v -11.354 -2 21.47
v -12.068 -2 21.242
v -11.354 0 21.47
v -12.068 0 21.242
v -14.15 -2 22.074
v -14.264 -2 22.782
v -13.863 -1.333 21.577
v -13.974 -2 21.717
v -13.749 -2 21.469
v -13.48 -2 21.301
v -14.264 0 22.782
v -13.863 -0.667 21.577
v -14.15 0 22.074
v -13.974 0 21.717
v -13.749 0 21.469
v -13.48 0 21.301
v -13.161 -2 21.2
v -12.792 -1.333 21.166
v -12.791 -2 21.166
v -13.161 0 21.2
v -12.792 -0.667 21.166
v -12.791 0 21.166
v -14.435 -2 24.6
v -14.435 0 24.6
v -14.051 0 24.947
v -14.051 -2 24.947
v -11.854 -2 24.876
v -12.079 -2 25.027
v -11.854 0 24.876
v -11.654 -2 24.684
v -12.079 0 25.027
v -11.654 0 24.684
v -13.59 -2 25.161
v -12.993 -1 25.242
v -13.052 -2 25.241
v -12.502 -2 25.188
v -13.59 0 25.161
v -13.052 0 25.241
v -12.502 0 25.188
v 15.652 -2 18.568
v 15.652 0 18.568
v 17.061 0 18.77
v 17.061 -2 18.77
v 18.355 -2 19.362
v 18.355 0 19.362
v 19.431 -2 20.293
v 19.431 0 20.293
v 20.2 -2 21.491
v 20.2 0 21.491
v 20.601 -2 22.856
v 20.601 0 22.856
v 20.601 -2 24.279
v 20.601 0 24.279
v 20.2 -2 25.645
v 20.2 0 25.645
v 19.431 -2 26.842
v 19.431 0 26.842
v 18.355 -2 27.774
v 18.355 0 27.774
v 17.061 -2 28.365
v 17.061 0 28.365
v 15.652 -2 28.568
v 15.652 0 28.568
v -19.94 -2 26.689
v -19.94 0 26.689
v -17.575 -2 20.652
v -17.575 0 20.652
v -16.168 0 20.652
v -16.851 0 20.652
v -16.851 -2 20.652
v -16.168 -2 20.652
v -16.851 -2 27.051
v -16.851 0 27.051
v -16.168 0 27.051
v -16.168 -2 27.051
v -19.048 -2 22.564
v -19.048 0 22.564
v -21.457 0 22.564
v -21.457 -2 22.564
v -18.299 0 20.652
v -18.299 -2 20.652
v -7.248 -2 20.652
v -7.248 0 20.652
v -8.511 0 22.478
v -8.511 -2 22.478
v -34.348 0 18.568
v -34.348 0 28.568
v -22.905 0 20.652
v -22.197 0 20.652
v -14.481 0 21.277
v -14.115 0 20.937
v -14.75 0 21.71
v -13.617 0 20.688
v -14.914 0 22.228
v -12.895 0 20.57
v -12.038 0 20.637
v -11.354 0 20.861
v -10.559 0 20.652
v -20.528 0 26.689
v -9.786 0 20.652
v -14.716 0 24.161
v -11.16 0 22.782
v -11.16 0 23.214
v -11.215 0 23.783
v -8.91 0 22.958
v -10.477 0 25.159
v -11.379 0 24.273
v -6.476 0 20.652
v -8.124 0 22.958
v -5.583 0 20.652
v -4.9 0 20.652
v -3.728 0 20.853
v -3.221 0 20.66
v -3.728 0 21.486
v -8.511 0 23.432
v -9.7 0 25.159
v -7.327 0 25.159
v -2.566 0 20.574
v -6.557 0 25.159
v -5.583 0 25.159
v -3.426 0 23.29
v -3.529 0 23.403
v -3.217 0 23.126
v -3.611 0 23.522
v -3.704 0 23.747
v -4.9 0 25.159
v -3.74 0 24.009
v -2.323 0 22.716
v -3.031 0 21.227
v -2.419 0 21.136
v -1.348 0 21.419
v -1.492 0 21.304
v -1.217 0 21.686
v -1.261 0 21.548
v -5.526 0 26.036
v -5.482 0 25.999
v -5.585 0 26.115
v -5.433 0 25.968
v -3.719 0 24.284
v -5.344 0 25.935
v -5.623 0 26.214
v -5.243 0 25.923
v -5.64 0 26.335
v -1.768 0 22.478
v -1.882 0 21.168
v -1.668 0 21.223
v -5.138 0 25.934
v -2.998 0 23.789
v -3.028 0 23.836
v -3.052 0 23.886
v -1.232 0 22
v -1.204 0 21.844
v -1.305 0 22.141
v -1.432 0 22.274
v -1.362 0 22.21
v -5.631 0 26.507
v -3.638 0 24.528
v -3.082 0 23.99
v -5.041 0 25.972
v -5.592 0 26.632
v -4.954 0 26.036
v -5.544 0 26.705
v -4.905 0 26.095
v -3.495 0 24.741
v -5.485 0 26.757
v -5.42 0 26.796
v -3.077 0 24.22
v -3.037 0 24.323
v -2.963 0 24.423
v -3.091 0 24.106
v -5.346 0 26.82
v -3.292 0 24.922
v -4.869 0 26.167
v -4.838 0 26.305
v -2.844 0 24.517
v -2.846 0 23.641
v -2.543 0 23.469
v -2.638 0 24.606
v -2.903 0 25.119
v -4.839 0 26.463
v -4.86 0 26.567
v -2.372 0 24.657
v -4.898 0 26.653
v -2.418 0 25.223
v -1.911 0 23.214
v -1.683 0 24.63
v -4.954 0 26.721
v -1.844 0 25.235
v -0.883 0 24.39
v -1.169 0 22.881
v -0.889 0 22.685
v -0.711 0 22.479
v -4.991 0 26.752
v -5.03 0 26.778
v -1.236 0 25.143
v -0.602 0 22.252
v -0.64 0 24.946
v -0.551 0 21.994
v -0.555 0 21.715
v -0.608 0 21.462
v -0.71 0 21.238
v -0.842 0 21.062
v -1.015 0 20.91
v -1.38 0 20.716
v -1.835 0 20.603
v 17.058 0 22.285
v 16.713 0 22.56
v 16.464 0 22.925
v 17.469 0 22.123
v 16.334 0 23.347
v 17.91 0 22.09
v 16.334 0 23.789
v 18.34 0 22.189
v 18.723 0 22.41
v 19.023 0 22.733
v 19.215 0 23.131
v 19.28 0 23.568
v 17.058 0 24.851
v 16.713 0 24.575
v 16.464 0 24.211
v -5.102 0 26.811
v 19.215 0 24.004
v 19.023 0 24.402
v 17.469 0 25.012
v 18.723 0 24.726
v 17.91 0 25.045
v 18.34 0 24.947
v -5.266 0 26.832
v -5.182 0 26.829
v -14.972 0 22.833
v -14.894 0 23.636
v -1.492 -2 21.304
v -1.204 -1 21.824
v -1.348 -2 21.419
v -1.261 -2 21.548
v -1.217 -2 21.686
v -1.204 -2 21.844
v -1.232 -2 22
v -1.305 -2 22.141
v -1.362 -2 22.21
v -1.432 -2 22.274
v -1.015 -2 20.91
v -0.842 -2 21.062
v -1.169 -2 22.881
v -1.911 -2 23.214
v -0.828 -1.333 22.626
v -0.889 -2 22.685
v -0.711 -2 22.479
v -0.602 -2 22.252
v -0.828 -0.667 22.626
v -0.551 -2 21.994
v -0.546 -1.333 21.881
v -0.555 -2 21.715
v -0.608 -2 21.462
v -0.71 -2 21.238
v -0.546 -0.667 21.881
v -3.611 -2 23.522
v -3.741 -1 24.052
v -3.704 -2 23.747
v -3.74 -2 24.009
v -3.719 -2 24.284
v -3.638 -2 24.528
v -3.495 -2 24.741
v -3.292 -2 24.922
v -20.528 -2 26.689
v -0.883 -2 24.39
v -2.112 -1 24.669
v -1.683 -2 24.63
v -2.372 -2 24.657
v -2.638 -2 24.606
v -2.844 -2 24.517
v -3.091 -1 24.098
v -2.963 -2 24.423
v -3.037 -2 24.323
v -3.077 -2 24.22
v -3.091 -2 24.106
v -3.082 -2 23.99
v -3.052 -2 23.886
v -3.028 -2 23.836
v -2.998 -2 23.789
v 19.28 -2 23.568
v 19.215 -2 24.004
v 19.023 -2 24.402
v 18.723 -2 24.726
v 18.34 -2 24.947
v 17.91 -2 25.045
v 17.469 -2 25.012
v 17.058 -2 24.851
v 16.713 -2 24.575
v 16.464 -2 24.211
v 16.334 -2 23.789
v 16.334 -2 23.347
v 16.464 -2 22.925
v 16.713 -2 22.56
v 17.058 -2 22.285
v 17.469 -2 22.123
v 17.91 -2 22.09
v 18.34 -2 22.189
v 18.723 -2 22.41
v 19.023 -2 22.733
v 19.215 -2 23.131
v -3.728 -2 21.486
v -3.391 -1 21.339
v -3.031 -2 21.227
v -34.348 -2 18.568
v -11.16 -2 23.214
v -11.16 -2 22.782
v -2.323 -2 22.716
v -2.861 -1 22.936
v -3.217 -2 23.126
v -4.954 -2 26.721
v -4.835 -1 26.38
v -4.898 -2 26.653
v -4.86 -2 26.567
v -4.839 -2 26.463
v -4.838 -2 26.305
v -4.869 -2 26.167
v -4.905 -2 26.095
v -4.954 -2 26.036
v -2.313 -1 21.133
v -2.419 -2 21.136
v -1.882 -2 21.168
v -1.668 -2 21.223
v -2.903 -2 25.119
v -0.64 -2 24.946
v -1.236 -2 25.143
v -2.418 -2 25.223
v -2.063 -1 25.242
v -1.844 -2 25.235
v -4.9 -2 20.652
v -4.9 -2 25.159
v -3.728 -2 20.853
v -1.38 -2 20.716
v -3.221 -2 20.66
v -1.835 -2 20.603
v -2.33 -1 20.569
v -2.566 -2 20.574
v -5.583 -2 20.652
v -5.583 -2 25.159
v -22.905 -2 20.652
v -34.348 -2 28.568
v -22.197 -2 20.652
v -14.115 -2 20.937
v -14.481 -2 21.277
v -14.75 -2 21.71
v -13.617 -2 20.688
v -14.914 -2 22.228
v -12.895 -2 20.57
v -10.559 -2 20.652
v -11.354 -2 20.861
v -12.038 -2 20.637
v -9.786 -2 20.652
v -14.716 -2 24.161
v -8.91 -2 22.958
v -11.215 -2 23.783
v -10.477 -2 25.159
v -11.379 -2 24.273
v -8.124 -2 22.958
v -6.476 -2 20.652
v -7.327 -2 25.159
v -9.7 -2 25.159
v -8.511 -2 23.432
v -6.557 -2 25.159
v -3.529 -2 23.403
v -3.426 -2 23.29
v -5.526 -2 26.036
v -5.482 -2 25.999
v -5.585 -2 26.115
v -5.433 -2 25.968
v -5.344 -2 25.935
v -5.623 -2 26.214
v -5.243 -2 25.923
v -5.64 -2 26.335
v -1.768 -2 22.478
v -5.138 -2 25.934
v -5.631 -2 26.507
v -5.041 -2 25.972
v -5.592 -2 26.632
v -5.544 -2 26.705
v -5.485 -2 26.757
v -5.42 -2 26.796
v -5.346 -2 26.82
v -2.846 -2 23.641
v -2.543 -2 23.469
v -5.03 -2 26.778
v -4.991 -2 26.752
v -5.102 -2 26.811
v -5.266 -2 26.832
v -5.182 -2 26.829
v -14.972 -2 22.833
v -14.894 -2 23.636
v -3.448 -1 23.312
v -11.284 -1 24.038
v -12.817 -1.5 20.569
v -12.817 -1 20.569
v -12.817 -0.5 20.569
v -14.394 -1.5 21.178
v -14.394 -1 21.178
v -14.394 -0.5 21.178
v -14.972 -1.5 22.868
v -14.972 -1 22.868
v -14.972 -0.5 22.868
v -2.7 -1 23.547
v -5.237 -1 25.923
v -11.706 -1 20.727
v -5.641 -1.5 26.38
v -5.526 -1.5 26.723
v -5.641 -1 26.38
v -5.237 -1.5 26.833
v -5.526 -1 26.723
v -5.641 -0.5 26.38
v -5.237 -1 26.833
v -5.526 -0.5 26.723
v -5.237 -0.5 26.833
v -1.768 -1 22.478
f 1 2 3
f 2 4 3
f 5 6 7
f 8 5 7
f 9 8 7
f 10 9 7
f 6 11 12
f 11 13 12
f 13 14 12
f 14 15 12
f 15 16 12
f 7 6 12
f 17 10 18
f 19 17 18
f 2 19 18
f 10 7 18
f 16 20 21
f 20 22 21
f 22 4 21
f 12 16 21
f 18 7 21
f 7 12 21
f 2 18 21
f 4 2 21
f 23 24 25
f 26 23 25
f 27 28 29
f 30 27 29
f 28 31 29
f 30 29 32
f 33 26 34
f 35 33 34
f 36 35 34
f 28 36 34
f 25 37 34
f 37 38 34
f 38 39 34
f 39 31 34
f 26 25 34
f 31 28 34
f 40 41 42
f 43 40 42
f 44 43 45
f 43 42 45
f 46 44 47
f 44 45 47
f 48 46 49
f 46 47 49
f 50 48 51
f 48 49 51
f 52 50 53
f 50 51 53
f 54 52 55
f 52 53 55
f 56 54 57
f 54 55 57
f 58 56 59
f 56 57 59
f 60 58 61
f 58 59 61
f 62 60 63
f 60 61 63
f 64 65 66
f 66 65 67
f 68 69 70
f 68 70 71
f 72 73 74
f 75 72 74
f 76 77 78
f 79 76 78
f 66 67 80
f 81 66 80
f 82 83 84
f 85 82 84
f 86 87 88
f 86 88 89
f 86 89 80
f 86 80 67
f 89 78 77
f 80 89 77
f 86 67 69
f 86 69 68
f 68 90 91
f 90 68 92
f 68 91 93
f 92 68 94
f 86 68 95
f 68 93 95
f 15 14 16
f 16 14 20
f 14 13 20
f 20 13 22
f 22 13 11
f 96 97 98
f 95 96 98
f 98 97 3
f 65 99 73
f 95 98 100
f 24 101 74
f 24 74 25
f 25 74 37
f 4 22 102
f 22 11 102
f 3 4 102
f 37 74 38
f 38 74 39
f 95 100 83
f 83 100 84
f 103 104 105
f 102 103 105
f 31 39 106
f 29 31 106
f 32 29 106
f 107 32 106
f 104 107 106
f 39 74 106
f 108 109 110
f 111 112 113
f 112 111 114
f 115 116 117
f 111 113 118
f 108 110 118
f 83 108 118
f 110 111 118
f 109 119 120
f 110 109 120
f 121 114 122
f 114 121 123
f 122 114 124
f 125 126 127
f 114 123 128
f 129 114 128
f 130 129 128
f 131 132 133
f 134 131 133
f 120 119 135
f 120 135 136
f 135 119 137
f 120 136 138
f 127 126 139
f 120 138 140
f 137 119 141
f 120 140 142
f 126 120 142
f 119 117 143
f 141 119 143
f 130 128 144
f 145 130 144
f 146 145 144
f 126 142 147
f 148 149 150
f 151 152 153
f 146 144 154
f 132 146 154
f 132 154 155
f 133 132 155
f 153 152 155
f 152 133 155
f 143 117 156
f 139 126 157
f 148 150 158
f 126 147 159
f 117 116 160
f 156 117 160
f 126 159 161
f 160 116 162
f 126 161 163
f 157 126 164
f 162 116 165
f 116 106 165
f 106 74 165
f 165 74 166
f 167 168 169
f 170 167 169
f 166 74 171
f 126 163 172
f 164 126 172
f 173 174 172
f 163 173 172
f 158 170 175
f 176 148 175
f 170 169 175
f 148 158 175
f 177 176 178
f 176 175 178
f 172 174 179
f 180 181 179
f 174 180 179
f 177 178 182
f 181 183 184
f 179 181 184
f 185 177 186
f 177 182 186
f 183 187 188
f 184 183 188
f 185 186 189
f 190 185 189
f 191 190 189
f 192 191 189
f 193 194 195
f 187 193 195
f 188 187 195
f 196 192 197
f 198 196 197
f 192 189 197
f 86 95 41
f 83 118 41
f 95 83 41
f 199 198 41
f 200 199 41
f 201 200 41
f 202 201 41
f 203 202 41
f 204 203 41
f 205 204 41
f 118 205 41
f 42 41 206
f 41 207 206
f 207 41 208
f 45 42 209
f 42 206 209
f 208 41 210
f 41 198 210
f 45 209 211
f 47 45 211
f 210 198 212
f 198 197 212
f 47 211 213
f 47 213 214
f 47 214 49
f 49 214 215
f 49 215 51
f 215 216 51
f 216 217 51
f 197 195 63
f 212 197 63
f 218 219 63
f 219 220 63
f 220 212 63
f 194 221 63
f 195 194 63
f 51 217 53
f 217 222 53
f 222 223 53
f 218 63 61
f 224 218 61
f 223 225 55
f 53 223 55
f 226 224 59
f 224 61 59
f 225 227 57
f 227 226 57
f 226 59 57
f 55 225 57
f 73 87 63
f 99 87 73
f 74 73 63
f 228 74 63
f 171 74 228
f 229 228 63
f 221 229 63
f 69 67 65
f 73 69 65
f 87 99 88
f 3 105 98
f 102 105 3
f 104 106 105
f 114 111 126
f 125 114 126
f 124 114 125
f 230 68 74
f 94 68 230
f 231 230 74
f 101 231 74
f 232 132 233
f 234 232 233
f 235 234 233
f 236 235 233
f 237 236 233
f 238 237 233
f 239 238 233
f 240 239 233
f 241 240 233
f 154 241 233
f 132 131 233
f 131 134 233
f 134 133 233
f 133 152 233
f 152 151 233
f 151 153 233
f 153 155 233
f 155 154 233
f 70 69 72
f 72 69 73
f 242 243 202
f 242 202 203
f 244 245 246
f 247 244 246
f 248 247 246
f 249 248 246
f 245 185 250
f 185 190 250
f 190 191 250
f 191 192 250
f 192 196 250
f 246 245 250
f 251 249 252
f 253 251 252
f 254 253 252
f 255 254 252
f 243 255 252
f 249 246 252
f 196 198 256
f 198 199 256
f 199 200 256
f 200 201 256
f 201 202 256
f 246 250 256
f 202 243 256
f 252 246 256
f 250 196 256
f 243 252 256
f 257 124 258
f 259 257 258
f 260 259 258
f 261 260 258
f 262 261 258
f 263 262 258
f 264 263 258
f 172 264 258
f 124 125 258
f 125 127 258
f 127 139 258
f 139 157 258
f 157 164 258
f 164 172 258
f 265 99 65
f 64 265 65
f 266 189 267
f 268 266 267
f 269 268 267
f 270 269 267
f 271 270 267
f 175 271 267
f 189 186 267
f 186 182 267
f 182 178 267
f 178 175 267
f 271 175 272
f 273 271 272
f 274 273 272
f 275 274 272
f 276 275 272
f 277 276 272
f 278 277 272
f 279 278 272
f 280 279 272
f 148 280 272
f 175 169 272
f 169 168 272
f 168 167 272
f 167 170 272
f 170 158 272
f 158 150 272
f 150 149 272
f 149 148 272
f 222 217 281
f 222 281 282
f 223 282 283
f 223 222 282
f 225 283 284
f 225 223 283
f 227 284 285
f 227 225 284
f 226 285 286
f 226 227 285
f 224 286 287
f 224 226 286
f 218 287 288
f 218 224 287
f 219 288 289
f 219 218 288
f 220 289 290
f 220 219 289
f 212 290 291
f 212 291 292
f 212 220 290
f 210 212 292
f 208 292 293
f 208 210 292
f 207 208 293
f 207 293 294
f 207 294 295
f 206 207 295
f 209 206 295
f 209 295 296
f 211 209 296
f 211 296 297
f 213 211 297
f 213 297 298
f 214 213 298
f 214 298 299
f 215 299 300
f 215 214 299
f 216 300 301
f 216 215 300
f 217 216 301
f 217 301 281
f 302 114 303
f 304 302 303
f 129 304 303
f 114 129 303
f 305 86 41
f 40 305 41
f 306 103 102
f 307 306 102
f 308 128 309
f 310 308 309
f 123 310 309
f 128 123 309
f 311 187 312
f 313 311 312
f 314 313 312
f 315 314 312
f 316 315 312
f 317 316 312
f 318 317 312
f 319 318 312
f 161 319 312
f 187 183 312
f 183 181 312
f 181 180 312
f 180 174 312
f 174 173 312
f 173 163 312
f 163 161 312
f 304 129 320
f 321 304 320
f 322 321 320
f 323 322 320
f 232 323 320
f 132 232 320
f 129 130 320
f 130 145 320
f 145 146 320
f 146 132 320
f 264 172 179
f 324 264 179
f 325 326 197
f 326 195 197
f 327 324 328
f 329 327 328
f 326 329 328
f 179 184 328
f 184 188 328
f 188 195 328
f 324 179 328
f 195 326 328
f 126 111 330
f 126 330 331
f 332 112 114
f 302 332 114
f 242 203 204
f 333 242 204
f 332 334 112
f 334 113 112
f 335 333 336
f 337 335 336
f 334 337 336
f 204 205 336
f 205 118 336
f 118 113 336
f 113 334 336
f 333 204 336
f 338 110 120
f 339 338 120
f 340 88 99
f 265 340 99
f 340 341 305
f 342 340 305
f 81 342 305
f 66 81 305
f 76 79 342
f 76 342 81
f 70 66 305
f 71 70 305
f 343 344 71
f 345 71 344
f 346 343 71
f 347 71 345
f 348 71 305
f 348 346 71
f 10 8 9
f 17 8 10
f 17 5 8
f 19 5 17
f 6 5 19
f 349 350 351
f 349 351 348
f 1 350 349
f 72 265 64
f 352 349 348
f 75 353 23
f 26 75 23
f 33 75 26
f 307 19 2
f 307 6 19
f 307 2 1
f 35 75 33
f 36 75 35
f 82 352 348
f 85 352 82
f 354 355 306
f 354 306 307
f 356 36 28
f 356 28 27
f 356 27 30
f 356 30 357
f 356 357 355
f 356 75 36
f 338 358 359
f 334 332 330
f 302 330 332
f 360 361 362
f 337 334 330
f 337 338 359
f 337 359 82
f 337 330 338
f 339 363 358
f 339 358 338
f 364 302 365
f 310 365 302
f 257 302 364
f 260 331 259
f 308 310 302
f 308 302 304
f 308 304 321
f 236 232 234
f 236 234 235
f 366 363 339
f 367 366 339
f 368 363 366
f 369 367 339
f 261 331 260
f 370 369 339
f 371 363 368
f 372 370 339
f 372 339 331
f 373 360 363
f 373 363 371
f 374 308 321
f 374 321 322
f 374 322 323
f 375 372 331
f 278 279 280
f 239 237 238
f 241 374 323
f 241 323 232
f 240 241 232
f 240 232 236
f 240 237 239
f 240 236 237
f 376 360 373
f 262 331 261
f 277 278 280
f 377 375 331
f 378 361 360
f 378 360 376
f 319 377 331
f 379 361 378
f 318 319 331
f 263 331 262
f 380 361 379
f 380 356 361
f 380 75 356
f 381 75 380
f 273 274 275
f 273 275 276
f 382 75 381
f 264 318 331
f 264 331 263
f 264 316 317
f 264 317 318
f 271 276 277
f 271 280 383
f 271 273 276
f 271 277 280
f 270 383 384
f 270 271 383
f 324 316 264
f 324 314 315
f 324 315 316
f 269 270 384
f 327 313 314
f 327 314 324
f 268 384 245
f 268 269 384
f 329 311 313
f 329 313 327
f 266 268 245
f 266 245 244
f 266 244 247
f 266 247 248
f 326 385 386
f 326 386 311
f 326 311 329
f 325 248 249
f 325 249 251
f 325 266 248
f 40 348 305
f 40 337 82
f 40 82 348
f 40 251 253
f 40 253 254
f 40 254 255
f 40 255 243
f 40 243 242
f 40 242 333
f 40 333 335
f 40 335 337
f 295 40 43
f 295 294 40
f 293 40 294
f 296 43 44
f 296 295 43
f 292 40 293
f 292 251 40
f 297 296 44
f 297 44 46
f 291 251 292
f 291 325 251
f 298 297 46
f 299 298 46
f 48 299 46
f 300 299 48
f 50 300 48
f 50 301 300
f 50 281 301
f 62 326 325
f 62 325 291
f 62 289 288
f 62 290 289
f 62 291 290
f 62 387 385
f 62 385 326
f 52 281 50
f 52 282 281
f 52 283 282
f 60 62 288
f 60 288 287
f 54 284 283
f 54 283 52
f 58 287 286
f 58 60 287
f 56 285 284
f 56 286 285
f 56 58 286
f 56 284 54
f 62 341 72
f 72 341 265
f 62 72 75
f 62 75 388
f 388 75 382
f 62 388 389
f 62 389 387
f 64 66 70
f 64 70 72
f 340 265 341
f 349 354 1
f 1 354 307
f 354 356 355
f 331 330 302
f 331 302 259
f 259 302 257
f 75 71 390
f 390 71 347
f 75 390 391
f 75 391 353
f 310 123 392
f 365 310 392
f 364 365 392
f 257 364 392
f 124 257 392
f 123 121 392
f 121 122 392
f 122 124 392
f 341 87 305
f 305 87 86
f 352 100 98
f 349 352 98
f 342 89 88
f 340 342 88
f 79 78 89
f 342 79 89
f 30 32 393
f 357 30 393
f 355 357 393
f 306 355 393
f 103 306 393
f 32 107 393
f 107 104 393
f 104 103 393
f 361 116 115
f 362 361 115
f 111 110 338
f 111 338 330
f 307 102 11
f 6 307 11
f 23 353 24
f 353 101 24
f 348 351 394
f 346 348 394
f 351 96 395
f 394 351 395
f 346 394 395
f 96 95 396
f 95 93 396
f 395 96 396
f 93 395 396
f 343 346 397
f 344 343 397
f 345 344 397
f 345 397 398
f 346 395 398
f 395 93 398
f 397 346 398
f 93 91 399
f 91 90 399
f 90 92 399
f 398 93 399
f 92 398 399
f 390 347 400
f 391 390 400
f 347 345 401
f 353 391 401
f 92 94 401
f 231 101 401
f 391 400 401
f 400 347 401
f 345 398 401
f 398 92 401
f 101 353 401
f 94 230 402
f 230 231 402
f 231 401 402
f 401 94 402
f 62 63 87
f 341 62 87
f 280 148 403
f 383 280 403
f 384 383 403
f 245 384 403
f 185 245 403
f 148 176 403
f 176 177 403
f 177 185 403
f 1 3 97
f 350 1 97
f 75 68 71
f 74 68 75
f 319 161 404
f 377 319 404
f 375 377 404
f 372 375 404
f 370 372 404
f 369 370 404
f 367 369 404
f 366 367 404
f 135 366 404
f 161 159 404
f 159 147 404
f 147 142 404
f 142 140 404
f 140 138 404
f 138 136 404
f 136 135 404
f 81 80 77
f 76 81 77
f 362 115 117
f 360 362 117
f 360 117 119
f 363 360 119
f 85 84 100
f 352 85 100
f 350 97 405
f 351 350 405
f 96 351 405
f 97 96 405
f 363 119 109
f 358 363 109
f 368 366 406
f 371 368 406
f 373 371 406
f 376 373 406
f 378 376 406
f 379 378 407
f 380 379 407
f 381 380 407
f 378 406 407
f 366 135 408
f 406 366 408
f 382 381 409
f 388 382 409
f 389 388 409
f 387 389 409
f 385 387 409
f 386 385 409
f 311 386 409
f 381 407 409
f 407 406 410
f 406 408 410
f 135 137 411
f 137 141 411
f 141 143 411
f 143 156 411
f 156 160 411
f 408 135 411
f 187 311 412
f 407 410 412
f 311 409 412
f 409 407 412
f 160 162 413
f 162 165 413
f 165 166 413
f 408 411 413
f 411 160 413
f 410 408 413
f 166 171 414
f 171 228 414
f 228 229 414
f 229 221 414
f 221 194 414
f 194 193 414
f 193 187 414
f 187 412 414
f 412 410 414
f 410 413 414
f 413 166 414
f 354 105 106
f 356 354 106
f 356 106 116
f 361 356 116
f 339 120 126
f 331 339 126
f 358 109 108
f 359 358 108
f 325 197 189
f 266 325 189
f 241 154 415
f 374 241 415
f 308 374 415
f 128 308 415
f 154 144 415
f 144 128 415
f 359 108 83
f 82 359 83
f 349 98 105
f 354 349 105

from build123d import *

# Parameters (mm, degrees)
F0_W     = 0.6829528259
F0_H     = 4.5069622906
F0_H_2   = 6.3992285019
F0_R     = 1.4814772489
F1_DEPTH = 2


with BuildPart() as f1:
    # F0 (on Front) → F1 (new body)
    with BuildSketch(Plane.XZ):
        with BuildLine():
            Line((15.6519781798, 28.567796193), (-34.3480218202, 28.567796193))
            Line((-34.3480218202, 28.567796193), (-34.3480218202, 18.567796193))
            Line((-34.3480218202, 18.567796193), (15.6519781798, 18.567796193))
            ThreePointArc((15.6519781798, 18.567796193), (20.6519781798, 23.567796193), (15.6519781798, 28.567796193))
        make_face()
        with BuildLine():
            add(Edge.make_bspline(
                [(-12.0378659954, 20.6372455488), (-12.3602618381, 20.5688186761), (-12.8168796234, 20.5688186761)],
                knots=[0, 0, 0, 1, 1, 1], degree=2))
            add(Edge.make_bspline(
                [(-12.8168796234, 20.5688186761), (-13.8156487851, 20.5688186761), (-14.3939874498, 21.1780810237)],
                knots=[0, 0, 0, 1, 1, 1], degree=2))
            add(Edge.make_bspline(
                [(-14.3939874498, 21.1780810237), (-14.9723261145, 21.7873433713), (-14.9723261145, 22.8676984197)],
                knots=[0, 0, 0, 1, 1, 1], degree=2))
            add(Edge.make_bspline(
                [(-14.9723261145, 22.8676984197), (-14.9723261145, 23.9585806792), (-14.4354383439, 24.6000826111)],
                knots=[0, 0, 0, 1, 1, 1], degree=2))
            add(Edge.make_bspline(
                [(-14.4354383439, 24.6000826111), (-13.8985505732, 25.2415845429), (-12.9932104109, 25.2415845429)],
                knots=[0, 0, 0, 1, 1, 1], degree=2))
            add(Edge.make_bspline(
                [(-12.9932104109, 25.2415845429), (-12.1470858115, 25.2415845429), (-11.653622787, 24.6843003006)],
                knots=[0, 0, 0, 1, 1, 1], degree=2))
            add(Edge.make_bspline(
                [(-11.653622787, 24.6843003006), (-11.1601597625, 24.1270160582), (-11.1601597625, 23.2137804875)],
                knots=[0, 0, 0, 1, 1, 1], degree=2))
            Line((-11.1601597625, 23.2137804875), (-11.1601597625, 22.7821648287))
            Line((-11.1601597625, 22.7821648287), (-14.264371162, 22.7821648287))
            add(Edge.make_bspline(
                [(-14.264371162, 22.7821648287), (-14.2433167396, 21.9886762853), (-13.8630212354, 21.5774570982)],
                knots=[0, 0, 0, 1, 1, 1], degree=2))
            add(Edge.make_bspline(
                [(-13.8630212354, 21.5774570982), (-13.4827257312, 21.1662379111), (-12.7918774969, 21.1662379111)],
                knots=[0, 0, 0, 1, 1, 1], degree=2))
            add(Edge.make_bspline(
                [(-12.7918774969, 21.1662379111), (-12.0641840234, 21.1662379111), (-11.3535972681, 21.4702111342)],
                knots=[0, 0, 0, 1, 1, 1], degree=2))
            Line((-11.3535972681, 21.4702111342), (-11.3535972681, 20.8609487866))
            add(Edge.make_bspline(
                [(-11.3535972681, 20.8609487866), (-11.7154701527, 20.7056724216), (-12.0378659954, 20.6372455488)],
                knots=[0, 0, 0, 1, 1, 1], degree=2))
        make_face(mode=Mode.SUBTRACT)
        Polygon((-10.5587928233, 20.6517204642), (-8.9099683707, 22.9584956162), (-10.4772069365, 25.1586827548), (-9.6995092099, 25.1586827548), (-8.5112502469, 23.4322201197), (-7.326938988, 25.1586827548), (-6.5571366698, 25.1586827548), (-8.1243752356, 22.9584956162), (-6.4755507831, 20.6517204642), (-7.2479849041, 20.6517204642), (-8.5112502469, 22.4781916056), (-9.7863587022, 20.6517204642), align=None, mode=Mode.SUBTRACT)
        with Locations((-5.2418932218, 22.9052016095)):
            Rectangle(F0_W, F0_H, mode=Mode.SUBTRACT)
        with BuildLine():
            add(Edge.make_bspline(
                [(-0.8277019798, 22.6255725623), (-0.5460990805, 22.3294947476), (-0.5460990805, 21.8807723706)],
                knots=[0, 0, 0, 1, 1, 1], degree=2))
            add(Edge.make_bspline(
                [(-0.5460990805, 21.8807723706), (-0.5460990805, 21.251771502), (-1.0145599784, 20.9102950891)],
                knots=[0, 0, 0, 1, 1, 1], degree=2))
            add(Edge.make_bspline(
                [(-1.0145599784, 20.9102950891), (-1.4830208763, 20.5688186761), (-2.3304613771, 20.5688186761)],
                knots=[0, 0, 0, 1, 1, 1], degree=2))
            add(Edge.make_bspline(
                [(-2.3304613771, 20.5688186761), (-3.2265902296, 20.5688186761), (-3.7279486625, 20.8530533782)],
                knots=[0, 0, 0, 1, 1, 1], degree=2))
            Line((-3.7279486625, 20.8530533782), (-3.7279486625, 21.486001951))
            add(Edge.make_bspline(
                [(-3.7279486625, 21.486001951), (-3.4029210171, 21.3215142762), (-3.0311788719, 21.2274273262)],
                knots=[0, 0, 0, 1, 1, 1], degree=2))
            add(Edge.make_bspline(
                [(-3.0311788719, 21.2274273262), (-2.6594367268, 21.1333403762), (-2.3133546589, 21.1333403762)],
                knots=[0, 0, 0, 1, 1, 1], degree=2))
            add(Edge.make_bspline(
                [(-2.3133546589, 21.1333403762), (-1.7790986911, 21.1333403762), (-1.4915742354, 21.3037496073)],
                knots=[0, 0, 0, 1, 1, 1], degree=2))
            add(Edge.make_bspline(
                [(-1.4915742354, 21.3037496073), (-1.2040497798, 21.4741588384), (-1.2040497798, 21.8241886105)],
                knots=[0, 0, 0, 1, 1, 1], degree=2))
            add(Edge.make_bspline(
                [(-1.2040497798, 21.8241886105), (-1.2040497798, 22.0873688902), (-1.4317007218, 22.2742268888)],
                knots=[0, 0, 0, 1, 1, 1], degree=2))
            add(Edge.make_bspline(
                [(-1.4317007218, 22.2742268888), (-1.6593516638, 22.4610848875), (-2.3225659687, 22.7163697588)],
                knots=[0, 0, 0, 1, 1, 1], degree=2))
            add(Edge.make_bspline(
                [(-2.3225659687, 22.7163697588), (-2.9515668373, 22.9506002078), (-3.2167209691, 23.1256150938)],
                knots=[0, 0, 0, 1, 1, 1], degree=2))
            add(Edge.make_bspline(
                [(-3.2167209691, 23.1256150938), (-3.481875101, 23.3006299798), (-3.6114913888, 23.5223593655)],
                knots=[0, 0, 0, 1, 1, 1], degree=2))
            add(Edge.make_bspline(
                [(-3.6114913888, 23.5223593655), (-3.7411076765, 23.7440887512), (-3.7411076765, 24.0520096785)],
                knots=[0, 0, 0, 1, 1, 1], degree=2))
            add(Edge.make_bspline(
                [(-3.7411076765, 24.0520096785), (-3.7411076765, 24.6033723646), (-3.2923852996, 24.9224784537)],
                knots=[0, 0, 0, 1, 1, 1], degree=2))
            add(Edge.make_bspline(
                [(-3.2923852996, 24.9224784537), (-2.8436629226, 25.2415845429), (-2.0633333932, 25.2415845429)],
                knots=[0, 0, 0, 1, 1, 1], degree=2))
            add(Edge.make_bspline(
                [(-2.0633333932, 25.2415845429), (-1.3356399197, 25.2415845429), (-0.6395280798, 24.9455067282)],
                knots=[0, 0, 0, 1, 1, 1], degree=2))
            Line((-0.6395280798, 24.9455067282), (-0.8829698385, 24.390196338))
            add(Edge.make_bspline(
                [(-0.8829698385, 24.390196338), (-1.5606590589, 24.6691674345), (-2.1120217449, 24.6691674345)],
                knots=[0, 0, 0, 1, 1, 1], degree=2))
            add(Edge.make_bspline(
                [(-2.1120217449, 24.6691674345), (-2.5975893611, 24.6691674345), (-2.8443208733, 24.5171808229)],
                knots=[0, 0, 0, 1, 1, 1], degree=2))
            add(Edge.make_bspline(
                [(-2.8443208733, 24.5171808229), (-3.0910523856, 24.3651942114), (-3.0910523856, 24.0980662275)],
                knots=[0, 0, 0, 1, 1, 1], degree=2))
            add(Edge.make_bspline(
                [(-3.0910523856, 24.0980662275), (-3.0910523856, 23.9164718344), (-2.998281337, 23.7894873495)],
                knots=[0, 0, 0, 1, 1, 1], degree=2))
            add(Edge.make_bspline(
                [(-2.998281337, 23.7894873495), (-2.9055102884, 23.6625028645), (-2.7002296702, 23.5473614921)],
                knots=[0, 0, 0, 1, 1, 1], degree=2))
            add(Edge.make_bspline(
                [(-2.7002296702, 23.5473614921), (-2.494949052, 23.4322201197), (-1.9106888309, 23.2137804875)],
                knots=[0, 0, 0, 1, 1, 1], degree=2))
            add(Edge.make_bspline(
                [(-1.9106888309, 23.2137804875), (-1.1093048791, 22.921650377), (-0.8277019798, 22.6255725623)],
                knots=[0, 0, 0, 1, 1, 1], degree=2))
        make_face(mode=Mode.SUBTRACT)
        Polygon((-17.5751790812, 20.6517204642), (-18.2989248505, 20.6517204642), (-19.0476727463, 22.5637251966), (-21.4570882074, 22.5637251966), (-22.1966247934, 20.6517204642), (-22.904579746, 20.6517204642), (-20.5280618199, 26.6890760815), (-19.9398538947, 26.6890760815), align=None, mode=Mode.SUBTRACT)
        with Locations((-16.5099568989, 23.8513347152)):
            Rectangle(F0_W, F0_H_2, mode=Mode.SUBTRACT)
        with Locations((17.7988428622, 23.567796193)):
            Circle(F0_R, mode=Mode.SUBTRACT)
        with BuildLine():
            add(Edge.make_bspline(
                [(-5.5261279239, 26.0363889878), (-5.6412692963, 26.149556508), (-5.6412692963, 26.3798392528)],
                knots=[0, 0, 0, 1, 1, 1], degree=2))
            add(Edge.make_bspline(
                [(-5.6412692963, 26.3798392528), (-5.6412692963, 26.6140697018), (-5.5261279239, 26.7232895179)],
                knots=[0, 0, 0, 1, 1, 1], degree=2))
            add(Edge.make_bspline(
                [(-5.5261279239, 26.7232895179), (-5.4109865515, 26.832509334), (-5.2372875669, 26.832509334)],
                knots=[0, 0, 0, 1, 1, 1], degree=2))
            add(Edge.make_bspline(
                [(-5.2372875669, 26.832509334), (-5.072799892, 26.832509334), (-4.9537108154, 26.7213156658)],
                knots=[0, 0, 0, 1, 1, 1], degree=2))
            add(Edge.make_bspline(
                [(-4.9537108154, 26.7213156658), (-4.8346217389, 26.6101219976), (-4.8346217389, 26.3798392528)],
                knots=[0, 0, 0, 1, 1, 1], degree=2))
            add(Edge.make_bspline(
                [(-4.8346217389, 26.3798392528), (-4.8346217389, 26.149556508), (-4.9537108154, 26.0363889878)],
                knots=[0, 0, 0, 1, 1, 1], degree=2))
            add(Edge.make_bspline(
                [(-4.9537108154, 26.0363889878), (-5.072799892, 25.9232214675), (-5.2372875669, 25.9232214675)],
                knots=[0, 0, 0, 1, 1, 1], degree=2))
            add(Edge.make_bspline(
                [(-5.2372875669, 25.9232214675), (-5.4109865515, 25.9232214675), (-5.5261279239, 26.0363889878)],
                knots=[0, 0, 0, 1, 1, 1], degree=2))
        make_face(mode=Mode.SUBTRACT)
    extrude(amount=F1_DEPTH)


solid = f1.part
